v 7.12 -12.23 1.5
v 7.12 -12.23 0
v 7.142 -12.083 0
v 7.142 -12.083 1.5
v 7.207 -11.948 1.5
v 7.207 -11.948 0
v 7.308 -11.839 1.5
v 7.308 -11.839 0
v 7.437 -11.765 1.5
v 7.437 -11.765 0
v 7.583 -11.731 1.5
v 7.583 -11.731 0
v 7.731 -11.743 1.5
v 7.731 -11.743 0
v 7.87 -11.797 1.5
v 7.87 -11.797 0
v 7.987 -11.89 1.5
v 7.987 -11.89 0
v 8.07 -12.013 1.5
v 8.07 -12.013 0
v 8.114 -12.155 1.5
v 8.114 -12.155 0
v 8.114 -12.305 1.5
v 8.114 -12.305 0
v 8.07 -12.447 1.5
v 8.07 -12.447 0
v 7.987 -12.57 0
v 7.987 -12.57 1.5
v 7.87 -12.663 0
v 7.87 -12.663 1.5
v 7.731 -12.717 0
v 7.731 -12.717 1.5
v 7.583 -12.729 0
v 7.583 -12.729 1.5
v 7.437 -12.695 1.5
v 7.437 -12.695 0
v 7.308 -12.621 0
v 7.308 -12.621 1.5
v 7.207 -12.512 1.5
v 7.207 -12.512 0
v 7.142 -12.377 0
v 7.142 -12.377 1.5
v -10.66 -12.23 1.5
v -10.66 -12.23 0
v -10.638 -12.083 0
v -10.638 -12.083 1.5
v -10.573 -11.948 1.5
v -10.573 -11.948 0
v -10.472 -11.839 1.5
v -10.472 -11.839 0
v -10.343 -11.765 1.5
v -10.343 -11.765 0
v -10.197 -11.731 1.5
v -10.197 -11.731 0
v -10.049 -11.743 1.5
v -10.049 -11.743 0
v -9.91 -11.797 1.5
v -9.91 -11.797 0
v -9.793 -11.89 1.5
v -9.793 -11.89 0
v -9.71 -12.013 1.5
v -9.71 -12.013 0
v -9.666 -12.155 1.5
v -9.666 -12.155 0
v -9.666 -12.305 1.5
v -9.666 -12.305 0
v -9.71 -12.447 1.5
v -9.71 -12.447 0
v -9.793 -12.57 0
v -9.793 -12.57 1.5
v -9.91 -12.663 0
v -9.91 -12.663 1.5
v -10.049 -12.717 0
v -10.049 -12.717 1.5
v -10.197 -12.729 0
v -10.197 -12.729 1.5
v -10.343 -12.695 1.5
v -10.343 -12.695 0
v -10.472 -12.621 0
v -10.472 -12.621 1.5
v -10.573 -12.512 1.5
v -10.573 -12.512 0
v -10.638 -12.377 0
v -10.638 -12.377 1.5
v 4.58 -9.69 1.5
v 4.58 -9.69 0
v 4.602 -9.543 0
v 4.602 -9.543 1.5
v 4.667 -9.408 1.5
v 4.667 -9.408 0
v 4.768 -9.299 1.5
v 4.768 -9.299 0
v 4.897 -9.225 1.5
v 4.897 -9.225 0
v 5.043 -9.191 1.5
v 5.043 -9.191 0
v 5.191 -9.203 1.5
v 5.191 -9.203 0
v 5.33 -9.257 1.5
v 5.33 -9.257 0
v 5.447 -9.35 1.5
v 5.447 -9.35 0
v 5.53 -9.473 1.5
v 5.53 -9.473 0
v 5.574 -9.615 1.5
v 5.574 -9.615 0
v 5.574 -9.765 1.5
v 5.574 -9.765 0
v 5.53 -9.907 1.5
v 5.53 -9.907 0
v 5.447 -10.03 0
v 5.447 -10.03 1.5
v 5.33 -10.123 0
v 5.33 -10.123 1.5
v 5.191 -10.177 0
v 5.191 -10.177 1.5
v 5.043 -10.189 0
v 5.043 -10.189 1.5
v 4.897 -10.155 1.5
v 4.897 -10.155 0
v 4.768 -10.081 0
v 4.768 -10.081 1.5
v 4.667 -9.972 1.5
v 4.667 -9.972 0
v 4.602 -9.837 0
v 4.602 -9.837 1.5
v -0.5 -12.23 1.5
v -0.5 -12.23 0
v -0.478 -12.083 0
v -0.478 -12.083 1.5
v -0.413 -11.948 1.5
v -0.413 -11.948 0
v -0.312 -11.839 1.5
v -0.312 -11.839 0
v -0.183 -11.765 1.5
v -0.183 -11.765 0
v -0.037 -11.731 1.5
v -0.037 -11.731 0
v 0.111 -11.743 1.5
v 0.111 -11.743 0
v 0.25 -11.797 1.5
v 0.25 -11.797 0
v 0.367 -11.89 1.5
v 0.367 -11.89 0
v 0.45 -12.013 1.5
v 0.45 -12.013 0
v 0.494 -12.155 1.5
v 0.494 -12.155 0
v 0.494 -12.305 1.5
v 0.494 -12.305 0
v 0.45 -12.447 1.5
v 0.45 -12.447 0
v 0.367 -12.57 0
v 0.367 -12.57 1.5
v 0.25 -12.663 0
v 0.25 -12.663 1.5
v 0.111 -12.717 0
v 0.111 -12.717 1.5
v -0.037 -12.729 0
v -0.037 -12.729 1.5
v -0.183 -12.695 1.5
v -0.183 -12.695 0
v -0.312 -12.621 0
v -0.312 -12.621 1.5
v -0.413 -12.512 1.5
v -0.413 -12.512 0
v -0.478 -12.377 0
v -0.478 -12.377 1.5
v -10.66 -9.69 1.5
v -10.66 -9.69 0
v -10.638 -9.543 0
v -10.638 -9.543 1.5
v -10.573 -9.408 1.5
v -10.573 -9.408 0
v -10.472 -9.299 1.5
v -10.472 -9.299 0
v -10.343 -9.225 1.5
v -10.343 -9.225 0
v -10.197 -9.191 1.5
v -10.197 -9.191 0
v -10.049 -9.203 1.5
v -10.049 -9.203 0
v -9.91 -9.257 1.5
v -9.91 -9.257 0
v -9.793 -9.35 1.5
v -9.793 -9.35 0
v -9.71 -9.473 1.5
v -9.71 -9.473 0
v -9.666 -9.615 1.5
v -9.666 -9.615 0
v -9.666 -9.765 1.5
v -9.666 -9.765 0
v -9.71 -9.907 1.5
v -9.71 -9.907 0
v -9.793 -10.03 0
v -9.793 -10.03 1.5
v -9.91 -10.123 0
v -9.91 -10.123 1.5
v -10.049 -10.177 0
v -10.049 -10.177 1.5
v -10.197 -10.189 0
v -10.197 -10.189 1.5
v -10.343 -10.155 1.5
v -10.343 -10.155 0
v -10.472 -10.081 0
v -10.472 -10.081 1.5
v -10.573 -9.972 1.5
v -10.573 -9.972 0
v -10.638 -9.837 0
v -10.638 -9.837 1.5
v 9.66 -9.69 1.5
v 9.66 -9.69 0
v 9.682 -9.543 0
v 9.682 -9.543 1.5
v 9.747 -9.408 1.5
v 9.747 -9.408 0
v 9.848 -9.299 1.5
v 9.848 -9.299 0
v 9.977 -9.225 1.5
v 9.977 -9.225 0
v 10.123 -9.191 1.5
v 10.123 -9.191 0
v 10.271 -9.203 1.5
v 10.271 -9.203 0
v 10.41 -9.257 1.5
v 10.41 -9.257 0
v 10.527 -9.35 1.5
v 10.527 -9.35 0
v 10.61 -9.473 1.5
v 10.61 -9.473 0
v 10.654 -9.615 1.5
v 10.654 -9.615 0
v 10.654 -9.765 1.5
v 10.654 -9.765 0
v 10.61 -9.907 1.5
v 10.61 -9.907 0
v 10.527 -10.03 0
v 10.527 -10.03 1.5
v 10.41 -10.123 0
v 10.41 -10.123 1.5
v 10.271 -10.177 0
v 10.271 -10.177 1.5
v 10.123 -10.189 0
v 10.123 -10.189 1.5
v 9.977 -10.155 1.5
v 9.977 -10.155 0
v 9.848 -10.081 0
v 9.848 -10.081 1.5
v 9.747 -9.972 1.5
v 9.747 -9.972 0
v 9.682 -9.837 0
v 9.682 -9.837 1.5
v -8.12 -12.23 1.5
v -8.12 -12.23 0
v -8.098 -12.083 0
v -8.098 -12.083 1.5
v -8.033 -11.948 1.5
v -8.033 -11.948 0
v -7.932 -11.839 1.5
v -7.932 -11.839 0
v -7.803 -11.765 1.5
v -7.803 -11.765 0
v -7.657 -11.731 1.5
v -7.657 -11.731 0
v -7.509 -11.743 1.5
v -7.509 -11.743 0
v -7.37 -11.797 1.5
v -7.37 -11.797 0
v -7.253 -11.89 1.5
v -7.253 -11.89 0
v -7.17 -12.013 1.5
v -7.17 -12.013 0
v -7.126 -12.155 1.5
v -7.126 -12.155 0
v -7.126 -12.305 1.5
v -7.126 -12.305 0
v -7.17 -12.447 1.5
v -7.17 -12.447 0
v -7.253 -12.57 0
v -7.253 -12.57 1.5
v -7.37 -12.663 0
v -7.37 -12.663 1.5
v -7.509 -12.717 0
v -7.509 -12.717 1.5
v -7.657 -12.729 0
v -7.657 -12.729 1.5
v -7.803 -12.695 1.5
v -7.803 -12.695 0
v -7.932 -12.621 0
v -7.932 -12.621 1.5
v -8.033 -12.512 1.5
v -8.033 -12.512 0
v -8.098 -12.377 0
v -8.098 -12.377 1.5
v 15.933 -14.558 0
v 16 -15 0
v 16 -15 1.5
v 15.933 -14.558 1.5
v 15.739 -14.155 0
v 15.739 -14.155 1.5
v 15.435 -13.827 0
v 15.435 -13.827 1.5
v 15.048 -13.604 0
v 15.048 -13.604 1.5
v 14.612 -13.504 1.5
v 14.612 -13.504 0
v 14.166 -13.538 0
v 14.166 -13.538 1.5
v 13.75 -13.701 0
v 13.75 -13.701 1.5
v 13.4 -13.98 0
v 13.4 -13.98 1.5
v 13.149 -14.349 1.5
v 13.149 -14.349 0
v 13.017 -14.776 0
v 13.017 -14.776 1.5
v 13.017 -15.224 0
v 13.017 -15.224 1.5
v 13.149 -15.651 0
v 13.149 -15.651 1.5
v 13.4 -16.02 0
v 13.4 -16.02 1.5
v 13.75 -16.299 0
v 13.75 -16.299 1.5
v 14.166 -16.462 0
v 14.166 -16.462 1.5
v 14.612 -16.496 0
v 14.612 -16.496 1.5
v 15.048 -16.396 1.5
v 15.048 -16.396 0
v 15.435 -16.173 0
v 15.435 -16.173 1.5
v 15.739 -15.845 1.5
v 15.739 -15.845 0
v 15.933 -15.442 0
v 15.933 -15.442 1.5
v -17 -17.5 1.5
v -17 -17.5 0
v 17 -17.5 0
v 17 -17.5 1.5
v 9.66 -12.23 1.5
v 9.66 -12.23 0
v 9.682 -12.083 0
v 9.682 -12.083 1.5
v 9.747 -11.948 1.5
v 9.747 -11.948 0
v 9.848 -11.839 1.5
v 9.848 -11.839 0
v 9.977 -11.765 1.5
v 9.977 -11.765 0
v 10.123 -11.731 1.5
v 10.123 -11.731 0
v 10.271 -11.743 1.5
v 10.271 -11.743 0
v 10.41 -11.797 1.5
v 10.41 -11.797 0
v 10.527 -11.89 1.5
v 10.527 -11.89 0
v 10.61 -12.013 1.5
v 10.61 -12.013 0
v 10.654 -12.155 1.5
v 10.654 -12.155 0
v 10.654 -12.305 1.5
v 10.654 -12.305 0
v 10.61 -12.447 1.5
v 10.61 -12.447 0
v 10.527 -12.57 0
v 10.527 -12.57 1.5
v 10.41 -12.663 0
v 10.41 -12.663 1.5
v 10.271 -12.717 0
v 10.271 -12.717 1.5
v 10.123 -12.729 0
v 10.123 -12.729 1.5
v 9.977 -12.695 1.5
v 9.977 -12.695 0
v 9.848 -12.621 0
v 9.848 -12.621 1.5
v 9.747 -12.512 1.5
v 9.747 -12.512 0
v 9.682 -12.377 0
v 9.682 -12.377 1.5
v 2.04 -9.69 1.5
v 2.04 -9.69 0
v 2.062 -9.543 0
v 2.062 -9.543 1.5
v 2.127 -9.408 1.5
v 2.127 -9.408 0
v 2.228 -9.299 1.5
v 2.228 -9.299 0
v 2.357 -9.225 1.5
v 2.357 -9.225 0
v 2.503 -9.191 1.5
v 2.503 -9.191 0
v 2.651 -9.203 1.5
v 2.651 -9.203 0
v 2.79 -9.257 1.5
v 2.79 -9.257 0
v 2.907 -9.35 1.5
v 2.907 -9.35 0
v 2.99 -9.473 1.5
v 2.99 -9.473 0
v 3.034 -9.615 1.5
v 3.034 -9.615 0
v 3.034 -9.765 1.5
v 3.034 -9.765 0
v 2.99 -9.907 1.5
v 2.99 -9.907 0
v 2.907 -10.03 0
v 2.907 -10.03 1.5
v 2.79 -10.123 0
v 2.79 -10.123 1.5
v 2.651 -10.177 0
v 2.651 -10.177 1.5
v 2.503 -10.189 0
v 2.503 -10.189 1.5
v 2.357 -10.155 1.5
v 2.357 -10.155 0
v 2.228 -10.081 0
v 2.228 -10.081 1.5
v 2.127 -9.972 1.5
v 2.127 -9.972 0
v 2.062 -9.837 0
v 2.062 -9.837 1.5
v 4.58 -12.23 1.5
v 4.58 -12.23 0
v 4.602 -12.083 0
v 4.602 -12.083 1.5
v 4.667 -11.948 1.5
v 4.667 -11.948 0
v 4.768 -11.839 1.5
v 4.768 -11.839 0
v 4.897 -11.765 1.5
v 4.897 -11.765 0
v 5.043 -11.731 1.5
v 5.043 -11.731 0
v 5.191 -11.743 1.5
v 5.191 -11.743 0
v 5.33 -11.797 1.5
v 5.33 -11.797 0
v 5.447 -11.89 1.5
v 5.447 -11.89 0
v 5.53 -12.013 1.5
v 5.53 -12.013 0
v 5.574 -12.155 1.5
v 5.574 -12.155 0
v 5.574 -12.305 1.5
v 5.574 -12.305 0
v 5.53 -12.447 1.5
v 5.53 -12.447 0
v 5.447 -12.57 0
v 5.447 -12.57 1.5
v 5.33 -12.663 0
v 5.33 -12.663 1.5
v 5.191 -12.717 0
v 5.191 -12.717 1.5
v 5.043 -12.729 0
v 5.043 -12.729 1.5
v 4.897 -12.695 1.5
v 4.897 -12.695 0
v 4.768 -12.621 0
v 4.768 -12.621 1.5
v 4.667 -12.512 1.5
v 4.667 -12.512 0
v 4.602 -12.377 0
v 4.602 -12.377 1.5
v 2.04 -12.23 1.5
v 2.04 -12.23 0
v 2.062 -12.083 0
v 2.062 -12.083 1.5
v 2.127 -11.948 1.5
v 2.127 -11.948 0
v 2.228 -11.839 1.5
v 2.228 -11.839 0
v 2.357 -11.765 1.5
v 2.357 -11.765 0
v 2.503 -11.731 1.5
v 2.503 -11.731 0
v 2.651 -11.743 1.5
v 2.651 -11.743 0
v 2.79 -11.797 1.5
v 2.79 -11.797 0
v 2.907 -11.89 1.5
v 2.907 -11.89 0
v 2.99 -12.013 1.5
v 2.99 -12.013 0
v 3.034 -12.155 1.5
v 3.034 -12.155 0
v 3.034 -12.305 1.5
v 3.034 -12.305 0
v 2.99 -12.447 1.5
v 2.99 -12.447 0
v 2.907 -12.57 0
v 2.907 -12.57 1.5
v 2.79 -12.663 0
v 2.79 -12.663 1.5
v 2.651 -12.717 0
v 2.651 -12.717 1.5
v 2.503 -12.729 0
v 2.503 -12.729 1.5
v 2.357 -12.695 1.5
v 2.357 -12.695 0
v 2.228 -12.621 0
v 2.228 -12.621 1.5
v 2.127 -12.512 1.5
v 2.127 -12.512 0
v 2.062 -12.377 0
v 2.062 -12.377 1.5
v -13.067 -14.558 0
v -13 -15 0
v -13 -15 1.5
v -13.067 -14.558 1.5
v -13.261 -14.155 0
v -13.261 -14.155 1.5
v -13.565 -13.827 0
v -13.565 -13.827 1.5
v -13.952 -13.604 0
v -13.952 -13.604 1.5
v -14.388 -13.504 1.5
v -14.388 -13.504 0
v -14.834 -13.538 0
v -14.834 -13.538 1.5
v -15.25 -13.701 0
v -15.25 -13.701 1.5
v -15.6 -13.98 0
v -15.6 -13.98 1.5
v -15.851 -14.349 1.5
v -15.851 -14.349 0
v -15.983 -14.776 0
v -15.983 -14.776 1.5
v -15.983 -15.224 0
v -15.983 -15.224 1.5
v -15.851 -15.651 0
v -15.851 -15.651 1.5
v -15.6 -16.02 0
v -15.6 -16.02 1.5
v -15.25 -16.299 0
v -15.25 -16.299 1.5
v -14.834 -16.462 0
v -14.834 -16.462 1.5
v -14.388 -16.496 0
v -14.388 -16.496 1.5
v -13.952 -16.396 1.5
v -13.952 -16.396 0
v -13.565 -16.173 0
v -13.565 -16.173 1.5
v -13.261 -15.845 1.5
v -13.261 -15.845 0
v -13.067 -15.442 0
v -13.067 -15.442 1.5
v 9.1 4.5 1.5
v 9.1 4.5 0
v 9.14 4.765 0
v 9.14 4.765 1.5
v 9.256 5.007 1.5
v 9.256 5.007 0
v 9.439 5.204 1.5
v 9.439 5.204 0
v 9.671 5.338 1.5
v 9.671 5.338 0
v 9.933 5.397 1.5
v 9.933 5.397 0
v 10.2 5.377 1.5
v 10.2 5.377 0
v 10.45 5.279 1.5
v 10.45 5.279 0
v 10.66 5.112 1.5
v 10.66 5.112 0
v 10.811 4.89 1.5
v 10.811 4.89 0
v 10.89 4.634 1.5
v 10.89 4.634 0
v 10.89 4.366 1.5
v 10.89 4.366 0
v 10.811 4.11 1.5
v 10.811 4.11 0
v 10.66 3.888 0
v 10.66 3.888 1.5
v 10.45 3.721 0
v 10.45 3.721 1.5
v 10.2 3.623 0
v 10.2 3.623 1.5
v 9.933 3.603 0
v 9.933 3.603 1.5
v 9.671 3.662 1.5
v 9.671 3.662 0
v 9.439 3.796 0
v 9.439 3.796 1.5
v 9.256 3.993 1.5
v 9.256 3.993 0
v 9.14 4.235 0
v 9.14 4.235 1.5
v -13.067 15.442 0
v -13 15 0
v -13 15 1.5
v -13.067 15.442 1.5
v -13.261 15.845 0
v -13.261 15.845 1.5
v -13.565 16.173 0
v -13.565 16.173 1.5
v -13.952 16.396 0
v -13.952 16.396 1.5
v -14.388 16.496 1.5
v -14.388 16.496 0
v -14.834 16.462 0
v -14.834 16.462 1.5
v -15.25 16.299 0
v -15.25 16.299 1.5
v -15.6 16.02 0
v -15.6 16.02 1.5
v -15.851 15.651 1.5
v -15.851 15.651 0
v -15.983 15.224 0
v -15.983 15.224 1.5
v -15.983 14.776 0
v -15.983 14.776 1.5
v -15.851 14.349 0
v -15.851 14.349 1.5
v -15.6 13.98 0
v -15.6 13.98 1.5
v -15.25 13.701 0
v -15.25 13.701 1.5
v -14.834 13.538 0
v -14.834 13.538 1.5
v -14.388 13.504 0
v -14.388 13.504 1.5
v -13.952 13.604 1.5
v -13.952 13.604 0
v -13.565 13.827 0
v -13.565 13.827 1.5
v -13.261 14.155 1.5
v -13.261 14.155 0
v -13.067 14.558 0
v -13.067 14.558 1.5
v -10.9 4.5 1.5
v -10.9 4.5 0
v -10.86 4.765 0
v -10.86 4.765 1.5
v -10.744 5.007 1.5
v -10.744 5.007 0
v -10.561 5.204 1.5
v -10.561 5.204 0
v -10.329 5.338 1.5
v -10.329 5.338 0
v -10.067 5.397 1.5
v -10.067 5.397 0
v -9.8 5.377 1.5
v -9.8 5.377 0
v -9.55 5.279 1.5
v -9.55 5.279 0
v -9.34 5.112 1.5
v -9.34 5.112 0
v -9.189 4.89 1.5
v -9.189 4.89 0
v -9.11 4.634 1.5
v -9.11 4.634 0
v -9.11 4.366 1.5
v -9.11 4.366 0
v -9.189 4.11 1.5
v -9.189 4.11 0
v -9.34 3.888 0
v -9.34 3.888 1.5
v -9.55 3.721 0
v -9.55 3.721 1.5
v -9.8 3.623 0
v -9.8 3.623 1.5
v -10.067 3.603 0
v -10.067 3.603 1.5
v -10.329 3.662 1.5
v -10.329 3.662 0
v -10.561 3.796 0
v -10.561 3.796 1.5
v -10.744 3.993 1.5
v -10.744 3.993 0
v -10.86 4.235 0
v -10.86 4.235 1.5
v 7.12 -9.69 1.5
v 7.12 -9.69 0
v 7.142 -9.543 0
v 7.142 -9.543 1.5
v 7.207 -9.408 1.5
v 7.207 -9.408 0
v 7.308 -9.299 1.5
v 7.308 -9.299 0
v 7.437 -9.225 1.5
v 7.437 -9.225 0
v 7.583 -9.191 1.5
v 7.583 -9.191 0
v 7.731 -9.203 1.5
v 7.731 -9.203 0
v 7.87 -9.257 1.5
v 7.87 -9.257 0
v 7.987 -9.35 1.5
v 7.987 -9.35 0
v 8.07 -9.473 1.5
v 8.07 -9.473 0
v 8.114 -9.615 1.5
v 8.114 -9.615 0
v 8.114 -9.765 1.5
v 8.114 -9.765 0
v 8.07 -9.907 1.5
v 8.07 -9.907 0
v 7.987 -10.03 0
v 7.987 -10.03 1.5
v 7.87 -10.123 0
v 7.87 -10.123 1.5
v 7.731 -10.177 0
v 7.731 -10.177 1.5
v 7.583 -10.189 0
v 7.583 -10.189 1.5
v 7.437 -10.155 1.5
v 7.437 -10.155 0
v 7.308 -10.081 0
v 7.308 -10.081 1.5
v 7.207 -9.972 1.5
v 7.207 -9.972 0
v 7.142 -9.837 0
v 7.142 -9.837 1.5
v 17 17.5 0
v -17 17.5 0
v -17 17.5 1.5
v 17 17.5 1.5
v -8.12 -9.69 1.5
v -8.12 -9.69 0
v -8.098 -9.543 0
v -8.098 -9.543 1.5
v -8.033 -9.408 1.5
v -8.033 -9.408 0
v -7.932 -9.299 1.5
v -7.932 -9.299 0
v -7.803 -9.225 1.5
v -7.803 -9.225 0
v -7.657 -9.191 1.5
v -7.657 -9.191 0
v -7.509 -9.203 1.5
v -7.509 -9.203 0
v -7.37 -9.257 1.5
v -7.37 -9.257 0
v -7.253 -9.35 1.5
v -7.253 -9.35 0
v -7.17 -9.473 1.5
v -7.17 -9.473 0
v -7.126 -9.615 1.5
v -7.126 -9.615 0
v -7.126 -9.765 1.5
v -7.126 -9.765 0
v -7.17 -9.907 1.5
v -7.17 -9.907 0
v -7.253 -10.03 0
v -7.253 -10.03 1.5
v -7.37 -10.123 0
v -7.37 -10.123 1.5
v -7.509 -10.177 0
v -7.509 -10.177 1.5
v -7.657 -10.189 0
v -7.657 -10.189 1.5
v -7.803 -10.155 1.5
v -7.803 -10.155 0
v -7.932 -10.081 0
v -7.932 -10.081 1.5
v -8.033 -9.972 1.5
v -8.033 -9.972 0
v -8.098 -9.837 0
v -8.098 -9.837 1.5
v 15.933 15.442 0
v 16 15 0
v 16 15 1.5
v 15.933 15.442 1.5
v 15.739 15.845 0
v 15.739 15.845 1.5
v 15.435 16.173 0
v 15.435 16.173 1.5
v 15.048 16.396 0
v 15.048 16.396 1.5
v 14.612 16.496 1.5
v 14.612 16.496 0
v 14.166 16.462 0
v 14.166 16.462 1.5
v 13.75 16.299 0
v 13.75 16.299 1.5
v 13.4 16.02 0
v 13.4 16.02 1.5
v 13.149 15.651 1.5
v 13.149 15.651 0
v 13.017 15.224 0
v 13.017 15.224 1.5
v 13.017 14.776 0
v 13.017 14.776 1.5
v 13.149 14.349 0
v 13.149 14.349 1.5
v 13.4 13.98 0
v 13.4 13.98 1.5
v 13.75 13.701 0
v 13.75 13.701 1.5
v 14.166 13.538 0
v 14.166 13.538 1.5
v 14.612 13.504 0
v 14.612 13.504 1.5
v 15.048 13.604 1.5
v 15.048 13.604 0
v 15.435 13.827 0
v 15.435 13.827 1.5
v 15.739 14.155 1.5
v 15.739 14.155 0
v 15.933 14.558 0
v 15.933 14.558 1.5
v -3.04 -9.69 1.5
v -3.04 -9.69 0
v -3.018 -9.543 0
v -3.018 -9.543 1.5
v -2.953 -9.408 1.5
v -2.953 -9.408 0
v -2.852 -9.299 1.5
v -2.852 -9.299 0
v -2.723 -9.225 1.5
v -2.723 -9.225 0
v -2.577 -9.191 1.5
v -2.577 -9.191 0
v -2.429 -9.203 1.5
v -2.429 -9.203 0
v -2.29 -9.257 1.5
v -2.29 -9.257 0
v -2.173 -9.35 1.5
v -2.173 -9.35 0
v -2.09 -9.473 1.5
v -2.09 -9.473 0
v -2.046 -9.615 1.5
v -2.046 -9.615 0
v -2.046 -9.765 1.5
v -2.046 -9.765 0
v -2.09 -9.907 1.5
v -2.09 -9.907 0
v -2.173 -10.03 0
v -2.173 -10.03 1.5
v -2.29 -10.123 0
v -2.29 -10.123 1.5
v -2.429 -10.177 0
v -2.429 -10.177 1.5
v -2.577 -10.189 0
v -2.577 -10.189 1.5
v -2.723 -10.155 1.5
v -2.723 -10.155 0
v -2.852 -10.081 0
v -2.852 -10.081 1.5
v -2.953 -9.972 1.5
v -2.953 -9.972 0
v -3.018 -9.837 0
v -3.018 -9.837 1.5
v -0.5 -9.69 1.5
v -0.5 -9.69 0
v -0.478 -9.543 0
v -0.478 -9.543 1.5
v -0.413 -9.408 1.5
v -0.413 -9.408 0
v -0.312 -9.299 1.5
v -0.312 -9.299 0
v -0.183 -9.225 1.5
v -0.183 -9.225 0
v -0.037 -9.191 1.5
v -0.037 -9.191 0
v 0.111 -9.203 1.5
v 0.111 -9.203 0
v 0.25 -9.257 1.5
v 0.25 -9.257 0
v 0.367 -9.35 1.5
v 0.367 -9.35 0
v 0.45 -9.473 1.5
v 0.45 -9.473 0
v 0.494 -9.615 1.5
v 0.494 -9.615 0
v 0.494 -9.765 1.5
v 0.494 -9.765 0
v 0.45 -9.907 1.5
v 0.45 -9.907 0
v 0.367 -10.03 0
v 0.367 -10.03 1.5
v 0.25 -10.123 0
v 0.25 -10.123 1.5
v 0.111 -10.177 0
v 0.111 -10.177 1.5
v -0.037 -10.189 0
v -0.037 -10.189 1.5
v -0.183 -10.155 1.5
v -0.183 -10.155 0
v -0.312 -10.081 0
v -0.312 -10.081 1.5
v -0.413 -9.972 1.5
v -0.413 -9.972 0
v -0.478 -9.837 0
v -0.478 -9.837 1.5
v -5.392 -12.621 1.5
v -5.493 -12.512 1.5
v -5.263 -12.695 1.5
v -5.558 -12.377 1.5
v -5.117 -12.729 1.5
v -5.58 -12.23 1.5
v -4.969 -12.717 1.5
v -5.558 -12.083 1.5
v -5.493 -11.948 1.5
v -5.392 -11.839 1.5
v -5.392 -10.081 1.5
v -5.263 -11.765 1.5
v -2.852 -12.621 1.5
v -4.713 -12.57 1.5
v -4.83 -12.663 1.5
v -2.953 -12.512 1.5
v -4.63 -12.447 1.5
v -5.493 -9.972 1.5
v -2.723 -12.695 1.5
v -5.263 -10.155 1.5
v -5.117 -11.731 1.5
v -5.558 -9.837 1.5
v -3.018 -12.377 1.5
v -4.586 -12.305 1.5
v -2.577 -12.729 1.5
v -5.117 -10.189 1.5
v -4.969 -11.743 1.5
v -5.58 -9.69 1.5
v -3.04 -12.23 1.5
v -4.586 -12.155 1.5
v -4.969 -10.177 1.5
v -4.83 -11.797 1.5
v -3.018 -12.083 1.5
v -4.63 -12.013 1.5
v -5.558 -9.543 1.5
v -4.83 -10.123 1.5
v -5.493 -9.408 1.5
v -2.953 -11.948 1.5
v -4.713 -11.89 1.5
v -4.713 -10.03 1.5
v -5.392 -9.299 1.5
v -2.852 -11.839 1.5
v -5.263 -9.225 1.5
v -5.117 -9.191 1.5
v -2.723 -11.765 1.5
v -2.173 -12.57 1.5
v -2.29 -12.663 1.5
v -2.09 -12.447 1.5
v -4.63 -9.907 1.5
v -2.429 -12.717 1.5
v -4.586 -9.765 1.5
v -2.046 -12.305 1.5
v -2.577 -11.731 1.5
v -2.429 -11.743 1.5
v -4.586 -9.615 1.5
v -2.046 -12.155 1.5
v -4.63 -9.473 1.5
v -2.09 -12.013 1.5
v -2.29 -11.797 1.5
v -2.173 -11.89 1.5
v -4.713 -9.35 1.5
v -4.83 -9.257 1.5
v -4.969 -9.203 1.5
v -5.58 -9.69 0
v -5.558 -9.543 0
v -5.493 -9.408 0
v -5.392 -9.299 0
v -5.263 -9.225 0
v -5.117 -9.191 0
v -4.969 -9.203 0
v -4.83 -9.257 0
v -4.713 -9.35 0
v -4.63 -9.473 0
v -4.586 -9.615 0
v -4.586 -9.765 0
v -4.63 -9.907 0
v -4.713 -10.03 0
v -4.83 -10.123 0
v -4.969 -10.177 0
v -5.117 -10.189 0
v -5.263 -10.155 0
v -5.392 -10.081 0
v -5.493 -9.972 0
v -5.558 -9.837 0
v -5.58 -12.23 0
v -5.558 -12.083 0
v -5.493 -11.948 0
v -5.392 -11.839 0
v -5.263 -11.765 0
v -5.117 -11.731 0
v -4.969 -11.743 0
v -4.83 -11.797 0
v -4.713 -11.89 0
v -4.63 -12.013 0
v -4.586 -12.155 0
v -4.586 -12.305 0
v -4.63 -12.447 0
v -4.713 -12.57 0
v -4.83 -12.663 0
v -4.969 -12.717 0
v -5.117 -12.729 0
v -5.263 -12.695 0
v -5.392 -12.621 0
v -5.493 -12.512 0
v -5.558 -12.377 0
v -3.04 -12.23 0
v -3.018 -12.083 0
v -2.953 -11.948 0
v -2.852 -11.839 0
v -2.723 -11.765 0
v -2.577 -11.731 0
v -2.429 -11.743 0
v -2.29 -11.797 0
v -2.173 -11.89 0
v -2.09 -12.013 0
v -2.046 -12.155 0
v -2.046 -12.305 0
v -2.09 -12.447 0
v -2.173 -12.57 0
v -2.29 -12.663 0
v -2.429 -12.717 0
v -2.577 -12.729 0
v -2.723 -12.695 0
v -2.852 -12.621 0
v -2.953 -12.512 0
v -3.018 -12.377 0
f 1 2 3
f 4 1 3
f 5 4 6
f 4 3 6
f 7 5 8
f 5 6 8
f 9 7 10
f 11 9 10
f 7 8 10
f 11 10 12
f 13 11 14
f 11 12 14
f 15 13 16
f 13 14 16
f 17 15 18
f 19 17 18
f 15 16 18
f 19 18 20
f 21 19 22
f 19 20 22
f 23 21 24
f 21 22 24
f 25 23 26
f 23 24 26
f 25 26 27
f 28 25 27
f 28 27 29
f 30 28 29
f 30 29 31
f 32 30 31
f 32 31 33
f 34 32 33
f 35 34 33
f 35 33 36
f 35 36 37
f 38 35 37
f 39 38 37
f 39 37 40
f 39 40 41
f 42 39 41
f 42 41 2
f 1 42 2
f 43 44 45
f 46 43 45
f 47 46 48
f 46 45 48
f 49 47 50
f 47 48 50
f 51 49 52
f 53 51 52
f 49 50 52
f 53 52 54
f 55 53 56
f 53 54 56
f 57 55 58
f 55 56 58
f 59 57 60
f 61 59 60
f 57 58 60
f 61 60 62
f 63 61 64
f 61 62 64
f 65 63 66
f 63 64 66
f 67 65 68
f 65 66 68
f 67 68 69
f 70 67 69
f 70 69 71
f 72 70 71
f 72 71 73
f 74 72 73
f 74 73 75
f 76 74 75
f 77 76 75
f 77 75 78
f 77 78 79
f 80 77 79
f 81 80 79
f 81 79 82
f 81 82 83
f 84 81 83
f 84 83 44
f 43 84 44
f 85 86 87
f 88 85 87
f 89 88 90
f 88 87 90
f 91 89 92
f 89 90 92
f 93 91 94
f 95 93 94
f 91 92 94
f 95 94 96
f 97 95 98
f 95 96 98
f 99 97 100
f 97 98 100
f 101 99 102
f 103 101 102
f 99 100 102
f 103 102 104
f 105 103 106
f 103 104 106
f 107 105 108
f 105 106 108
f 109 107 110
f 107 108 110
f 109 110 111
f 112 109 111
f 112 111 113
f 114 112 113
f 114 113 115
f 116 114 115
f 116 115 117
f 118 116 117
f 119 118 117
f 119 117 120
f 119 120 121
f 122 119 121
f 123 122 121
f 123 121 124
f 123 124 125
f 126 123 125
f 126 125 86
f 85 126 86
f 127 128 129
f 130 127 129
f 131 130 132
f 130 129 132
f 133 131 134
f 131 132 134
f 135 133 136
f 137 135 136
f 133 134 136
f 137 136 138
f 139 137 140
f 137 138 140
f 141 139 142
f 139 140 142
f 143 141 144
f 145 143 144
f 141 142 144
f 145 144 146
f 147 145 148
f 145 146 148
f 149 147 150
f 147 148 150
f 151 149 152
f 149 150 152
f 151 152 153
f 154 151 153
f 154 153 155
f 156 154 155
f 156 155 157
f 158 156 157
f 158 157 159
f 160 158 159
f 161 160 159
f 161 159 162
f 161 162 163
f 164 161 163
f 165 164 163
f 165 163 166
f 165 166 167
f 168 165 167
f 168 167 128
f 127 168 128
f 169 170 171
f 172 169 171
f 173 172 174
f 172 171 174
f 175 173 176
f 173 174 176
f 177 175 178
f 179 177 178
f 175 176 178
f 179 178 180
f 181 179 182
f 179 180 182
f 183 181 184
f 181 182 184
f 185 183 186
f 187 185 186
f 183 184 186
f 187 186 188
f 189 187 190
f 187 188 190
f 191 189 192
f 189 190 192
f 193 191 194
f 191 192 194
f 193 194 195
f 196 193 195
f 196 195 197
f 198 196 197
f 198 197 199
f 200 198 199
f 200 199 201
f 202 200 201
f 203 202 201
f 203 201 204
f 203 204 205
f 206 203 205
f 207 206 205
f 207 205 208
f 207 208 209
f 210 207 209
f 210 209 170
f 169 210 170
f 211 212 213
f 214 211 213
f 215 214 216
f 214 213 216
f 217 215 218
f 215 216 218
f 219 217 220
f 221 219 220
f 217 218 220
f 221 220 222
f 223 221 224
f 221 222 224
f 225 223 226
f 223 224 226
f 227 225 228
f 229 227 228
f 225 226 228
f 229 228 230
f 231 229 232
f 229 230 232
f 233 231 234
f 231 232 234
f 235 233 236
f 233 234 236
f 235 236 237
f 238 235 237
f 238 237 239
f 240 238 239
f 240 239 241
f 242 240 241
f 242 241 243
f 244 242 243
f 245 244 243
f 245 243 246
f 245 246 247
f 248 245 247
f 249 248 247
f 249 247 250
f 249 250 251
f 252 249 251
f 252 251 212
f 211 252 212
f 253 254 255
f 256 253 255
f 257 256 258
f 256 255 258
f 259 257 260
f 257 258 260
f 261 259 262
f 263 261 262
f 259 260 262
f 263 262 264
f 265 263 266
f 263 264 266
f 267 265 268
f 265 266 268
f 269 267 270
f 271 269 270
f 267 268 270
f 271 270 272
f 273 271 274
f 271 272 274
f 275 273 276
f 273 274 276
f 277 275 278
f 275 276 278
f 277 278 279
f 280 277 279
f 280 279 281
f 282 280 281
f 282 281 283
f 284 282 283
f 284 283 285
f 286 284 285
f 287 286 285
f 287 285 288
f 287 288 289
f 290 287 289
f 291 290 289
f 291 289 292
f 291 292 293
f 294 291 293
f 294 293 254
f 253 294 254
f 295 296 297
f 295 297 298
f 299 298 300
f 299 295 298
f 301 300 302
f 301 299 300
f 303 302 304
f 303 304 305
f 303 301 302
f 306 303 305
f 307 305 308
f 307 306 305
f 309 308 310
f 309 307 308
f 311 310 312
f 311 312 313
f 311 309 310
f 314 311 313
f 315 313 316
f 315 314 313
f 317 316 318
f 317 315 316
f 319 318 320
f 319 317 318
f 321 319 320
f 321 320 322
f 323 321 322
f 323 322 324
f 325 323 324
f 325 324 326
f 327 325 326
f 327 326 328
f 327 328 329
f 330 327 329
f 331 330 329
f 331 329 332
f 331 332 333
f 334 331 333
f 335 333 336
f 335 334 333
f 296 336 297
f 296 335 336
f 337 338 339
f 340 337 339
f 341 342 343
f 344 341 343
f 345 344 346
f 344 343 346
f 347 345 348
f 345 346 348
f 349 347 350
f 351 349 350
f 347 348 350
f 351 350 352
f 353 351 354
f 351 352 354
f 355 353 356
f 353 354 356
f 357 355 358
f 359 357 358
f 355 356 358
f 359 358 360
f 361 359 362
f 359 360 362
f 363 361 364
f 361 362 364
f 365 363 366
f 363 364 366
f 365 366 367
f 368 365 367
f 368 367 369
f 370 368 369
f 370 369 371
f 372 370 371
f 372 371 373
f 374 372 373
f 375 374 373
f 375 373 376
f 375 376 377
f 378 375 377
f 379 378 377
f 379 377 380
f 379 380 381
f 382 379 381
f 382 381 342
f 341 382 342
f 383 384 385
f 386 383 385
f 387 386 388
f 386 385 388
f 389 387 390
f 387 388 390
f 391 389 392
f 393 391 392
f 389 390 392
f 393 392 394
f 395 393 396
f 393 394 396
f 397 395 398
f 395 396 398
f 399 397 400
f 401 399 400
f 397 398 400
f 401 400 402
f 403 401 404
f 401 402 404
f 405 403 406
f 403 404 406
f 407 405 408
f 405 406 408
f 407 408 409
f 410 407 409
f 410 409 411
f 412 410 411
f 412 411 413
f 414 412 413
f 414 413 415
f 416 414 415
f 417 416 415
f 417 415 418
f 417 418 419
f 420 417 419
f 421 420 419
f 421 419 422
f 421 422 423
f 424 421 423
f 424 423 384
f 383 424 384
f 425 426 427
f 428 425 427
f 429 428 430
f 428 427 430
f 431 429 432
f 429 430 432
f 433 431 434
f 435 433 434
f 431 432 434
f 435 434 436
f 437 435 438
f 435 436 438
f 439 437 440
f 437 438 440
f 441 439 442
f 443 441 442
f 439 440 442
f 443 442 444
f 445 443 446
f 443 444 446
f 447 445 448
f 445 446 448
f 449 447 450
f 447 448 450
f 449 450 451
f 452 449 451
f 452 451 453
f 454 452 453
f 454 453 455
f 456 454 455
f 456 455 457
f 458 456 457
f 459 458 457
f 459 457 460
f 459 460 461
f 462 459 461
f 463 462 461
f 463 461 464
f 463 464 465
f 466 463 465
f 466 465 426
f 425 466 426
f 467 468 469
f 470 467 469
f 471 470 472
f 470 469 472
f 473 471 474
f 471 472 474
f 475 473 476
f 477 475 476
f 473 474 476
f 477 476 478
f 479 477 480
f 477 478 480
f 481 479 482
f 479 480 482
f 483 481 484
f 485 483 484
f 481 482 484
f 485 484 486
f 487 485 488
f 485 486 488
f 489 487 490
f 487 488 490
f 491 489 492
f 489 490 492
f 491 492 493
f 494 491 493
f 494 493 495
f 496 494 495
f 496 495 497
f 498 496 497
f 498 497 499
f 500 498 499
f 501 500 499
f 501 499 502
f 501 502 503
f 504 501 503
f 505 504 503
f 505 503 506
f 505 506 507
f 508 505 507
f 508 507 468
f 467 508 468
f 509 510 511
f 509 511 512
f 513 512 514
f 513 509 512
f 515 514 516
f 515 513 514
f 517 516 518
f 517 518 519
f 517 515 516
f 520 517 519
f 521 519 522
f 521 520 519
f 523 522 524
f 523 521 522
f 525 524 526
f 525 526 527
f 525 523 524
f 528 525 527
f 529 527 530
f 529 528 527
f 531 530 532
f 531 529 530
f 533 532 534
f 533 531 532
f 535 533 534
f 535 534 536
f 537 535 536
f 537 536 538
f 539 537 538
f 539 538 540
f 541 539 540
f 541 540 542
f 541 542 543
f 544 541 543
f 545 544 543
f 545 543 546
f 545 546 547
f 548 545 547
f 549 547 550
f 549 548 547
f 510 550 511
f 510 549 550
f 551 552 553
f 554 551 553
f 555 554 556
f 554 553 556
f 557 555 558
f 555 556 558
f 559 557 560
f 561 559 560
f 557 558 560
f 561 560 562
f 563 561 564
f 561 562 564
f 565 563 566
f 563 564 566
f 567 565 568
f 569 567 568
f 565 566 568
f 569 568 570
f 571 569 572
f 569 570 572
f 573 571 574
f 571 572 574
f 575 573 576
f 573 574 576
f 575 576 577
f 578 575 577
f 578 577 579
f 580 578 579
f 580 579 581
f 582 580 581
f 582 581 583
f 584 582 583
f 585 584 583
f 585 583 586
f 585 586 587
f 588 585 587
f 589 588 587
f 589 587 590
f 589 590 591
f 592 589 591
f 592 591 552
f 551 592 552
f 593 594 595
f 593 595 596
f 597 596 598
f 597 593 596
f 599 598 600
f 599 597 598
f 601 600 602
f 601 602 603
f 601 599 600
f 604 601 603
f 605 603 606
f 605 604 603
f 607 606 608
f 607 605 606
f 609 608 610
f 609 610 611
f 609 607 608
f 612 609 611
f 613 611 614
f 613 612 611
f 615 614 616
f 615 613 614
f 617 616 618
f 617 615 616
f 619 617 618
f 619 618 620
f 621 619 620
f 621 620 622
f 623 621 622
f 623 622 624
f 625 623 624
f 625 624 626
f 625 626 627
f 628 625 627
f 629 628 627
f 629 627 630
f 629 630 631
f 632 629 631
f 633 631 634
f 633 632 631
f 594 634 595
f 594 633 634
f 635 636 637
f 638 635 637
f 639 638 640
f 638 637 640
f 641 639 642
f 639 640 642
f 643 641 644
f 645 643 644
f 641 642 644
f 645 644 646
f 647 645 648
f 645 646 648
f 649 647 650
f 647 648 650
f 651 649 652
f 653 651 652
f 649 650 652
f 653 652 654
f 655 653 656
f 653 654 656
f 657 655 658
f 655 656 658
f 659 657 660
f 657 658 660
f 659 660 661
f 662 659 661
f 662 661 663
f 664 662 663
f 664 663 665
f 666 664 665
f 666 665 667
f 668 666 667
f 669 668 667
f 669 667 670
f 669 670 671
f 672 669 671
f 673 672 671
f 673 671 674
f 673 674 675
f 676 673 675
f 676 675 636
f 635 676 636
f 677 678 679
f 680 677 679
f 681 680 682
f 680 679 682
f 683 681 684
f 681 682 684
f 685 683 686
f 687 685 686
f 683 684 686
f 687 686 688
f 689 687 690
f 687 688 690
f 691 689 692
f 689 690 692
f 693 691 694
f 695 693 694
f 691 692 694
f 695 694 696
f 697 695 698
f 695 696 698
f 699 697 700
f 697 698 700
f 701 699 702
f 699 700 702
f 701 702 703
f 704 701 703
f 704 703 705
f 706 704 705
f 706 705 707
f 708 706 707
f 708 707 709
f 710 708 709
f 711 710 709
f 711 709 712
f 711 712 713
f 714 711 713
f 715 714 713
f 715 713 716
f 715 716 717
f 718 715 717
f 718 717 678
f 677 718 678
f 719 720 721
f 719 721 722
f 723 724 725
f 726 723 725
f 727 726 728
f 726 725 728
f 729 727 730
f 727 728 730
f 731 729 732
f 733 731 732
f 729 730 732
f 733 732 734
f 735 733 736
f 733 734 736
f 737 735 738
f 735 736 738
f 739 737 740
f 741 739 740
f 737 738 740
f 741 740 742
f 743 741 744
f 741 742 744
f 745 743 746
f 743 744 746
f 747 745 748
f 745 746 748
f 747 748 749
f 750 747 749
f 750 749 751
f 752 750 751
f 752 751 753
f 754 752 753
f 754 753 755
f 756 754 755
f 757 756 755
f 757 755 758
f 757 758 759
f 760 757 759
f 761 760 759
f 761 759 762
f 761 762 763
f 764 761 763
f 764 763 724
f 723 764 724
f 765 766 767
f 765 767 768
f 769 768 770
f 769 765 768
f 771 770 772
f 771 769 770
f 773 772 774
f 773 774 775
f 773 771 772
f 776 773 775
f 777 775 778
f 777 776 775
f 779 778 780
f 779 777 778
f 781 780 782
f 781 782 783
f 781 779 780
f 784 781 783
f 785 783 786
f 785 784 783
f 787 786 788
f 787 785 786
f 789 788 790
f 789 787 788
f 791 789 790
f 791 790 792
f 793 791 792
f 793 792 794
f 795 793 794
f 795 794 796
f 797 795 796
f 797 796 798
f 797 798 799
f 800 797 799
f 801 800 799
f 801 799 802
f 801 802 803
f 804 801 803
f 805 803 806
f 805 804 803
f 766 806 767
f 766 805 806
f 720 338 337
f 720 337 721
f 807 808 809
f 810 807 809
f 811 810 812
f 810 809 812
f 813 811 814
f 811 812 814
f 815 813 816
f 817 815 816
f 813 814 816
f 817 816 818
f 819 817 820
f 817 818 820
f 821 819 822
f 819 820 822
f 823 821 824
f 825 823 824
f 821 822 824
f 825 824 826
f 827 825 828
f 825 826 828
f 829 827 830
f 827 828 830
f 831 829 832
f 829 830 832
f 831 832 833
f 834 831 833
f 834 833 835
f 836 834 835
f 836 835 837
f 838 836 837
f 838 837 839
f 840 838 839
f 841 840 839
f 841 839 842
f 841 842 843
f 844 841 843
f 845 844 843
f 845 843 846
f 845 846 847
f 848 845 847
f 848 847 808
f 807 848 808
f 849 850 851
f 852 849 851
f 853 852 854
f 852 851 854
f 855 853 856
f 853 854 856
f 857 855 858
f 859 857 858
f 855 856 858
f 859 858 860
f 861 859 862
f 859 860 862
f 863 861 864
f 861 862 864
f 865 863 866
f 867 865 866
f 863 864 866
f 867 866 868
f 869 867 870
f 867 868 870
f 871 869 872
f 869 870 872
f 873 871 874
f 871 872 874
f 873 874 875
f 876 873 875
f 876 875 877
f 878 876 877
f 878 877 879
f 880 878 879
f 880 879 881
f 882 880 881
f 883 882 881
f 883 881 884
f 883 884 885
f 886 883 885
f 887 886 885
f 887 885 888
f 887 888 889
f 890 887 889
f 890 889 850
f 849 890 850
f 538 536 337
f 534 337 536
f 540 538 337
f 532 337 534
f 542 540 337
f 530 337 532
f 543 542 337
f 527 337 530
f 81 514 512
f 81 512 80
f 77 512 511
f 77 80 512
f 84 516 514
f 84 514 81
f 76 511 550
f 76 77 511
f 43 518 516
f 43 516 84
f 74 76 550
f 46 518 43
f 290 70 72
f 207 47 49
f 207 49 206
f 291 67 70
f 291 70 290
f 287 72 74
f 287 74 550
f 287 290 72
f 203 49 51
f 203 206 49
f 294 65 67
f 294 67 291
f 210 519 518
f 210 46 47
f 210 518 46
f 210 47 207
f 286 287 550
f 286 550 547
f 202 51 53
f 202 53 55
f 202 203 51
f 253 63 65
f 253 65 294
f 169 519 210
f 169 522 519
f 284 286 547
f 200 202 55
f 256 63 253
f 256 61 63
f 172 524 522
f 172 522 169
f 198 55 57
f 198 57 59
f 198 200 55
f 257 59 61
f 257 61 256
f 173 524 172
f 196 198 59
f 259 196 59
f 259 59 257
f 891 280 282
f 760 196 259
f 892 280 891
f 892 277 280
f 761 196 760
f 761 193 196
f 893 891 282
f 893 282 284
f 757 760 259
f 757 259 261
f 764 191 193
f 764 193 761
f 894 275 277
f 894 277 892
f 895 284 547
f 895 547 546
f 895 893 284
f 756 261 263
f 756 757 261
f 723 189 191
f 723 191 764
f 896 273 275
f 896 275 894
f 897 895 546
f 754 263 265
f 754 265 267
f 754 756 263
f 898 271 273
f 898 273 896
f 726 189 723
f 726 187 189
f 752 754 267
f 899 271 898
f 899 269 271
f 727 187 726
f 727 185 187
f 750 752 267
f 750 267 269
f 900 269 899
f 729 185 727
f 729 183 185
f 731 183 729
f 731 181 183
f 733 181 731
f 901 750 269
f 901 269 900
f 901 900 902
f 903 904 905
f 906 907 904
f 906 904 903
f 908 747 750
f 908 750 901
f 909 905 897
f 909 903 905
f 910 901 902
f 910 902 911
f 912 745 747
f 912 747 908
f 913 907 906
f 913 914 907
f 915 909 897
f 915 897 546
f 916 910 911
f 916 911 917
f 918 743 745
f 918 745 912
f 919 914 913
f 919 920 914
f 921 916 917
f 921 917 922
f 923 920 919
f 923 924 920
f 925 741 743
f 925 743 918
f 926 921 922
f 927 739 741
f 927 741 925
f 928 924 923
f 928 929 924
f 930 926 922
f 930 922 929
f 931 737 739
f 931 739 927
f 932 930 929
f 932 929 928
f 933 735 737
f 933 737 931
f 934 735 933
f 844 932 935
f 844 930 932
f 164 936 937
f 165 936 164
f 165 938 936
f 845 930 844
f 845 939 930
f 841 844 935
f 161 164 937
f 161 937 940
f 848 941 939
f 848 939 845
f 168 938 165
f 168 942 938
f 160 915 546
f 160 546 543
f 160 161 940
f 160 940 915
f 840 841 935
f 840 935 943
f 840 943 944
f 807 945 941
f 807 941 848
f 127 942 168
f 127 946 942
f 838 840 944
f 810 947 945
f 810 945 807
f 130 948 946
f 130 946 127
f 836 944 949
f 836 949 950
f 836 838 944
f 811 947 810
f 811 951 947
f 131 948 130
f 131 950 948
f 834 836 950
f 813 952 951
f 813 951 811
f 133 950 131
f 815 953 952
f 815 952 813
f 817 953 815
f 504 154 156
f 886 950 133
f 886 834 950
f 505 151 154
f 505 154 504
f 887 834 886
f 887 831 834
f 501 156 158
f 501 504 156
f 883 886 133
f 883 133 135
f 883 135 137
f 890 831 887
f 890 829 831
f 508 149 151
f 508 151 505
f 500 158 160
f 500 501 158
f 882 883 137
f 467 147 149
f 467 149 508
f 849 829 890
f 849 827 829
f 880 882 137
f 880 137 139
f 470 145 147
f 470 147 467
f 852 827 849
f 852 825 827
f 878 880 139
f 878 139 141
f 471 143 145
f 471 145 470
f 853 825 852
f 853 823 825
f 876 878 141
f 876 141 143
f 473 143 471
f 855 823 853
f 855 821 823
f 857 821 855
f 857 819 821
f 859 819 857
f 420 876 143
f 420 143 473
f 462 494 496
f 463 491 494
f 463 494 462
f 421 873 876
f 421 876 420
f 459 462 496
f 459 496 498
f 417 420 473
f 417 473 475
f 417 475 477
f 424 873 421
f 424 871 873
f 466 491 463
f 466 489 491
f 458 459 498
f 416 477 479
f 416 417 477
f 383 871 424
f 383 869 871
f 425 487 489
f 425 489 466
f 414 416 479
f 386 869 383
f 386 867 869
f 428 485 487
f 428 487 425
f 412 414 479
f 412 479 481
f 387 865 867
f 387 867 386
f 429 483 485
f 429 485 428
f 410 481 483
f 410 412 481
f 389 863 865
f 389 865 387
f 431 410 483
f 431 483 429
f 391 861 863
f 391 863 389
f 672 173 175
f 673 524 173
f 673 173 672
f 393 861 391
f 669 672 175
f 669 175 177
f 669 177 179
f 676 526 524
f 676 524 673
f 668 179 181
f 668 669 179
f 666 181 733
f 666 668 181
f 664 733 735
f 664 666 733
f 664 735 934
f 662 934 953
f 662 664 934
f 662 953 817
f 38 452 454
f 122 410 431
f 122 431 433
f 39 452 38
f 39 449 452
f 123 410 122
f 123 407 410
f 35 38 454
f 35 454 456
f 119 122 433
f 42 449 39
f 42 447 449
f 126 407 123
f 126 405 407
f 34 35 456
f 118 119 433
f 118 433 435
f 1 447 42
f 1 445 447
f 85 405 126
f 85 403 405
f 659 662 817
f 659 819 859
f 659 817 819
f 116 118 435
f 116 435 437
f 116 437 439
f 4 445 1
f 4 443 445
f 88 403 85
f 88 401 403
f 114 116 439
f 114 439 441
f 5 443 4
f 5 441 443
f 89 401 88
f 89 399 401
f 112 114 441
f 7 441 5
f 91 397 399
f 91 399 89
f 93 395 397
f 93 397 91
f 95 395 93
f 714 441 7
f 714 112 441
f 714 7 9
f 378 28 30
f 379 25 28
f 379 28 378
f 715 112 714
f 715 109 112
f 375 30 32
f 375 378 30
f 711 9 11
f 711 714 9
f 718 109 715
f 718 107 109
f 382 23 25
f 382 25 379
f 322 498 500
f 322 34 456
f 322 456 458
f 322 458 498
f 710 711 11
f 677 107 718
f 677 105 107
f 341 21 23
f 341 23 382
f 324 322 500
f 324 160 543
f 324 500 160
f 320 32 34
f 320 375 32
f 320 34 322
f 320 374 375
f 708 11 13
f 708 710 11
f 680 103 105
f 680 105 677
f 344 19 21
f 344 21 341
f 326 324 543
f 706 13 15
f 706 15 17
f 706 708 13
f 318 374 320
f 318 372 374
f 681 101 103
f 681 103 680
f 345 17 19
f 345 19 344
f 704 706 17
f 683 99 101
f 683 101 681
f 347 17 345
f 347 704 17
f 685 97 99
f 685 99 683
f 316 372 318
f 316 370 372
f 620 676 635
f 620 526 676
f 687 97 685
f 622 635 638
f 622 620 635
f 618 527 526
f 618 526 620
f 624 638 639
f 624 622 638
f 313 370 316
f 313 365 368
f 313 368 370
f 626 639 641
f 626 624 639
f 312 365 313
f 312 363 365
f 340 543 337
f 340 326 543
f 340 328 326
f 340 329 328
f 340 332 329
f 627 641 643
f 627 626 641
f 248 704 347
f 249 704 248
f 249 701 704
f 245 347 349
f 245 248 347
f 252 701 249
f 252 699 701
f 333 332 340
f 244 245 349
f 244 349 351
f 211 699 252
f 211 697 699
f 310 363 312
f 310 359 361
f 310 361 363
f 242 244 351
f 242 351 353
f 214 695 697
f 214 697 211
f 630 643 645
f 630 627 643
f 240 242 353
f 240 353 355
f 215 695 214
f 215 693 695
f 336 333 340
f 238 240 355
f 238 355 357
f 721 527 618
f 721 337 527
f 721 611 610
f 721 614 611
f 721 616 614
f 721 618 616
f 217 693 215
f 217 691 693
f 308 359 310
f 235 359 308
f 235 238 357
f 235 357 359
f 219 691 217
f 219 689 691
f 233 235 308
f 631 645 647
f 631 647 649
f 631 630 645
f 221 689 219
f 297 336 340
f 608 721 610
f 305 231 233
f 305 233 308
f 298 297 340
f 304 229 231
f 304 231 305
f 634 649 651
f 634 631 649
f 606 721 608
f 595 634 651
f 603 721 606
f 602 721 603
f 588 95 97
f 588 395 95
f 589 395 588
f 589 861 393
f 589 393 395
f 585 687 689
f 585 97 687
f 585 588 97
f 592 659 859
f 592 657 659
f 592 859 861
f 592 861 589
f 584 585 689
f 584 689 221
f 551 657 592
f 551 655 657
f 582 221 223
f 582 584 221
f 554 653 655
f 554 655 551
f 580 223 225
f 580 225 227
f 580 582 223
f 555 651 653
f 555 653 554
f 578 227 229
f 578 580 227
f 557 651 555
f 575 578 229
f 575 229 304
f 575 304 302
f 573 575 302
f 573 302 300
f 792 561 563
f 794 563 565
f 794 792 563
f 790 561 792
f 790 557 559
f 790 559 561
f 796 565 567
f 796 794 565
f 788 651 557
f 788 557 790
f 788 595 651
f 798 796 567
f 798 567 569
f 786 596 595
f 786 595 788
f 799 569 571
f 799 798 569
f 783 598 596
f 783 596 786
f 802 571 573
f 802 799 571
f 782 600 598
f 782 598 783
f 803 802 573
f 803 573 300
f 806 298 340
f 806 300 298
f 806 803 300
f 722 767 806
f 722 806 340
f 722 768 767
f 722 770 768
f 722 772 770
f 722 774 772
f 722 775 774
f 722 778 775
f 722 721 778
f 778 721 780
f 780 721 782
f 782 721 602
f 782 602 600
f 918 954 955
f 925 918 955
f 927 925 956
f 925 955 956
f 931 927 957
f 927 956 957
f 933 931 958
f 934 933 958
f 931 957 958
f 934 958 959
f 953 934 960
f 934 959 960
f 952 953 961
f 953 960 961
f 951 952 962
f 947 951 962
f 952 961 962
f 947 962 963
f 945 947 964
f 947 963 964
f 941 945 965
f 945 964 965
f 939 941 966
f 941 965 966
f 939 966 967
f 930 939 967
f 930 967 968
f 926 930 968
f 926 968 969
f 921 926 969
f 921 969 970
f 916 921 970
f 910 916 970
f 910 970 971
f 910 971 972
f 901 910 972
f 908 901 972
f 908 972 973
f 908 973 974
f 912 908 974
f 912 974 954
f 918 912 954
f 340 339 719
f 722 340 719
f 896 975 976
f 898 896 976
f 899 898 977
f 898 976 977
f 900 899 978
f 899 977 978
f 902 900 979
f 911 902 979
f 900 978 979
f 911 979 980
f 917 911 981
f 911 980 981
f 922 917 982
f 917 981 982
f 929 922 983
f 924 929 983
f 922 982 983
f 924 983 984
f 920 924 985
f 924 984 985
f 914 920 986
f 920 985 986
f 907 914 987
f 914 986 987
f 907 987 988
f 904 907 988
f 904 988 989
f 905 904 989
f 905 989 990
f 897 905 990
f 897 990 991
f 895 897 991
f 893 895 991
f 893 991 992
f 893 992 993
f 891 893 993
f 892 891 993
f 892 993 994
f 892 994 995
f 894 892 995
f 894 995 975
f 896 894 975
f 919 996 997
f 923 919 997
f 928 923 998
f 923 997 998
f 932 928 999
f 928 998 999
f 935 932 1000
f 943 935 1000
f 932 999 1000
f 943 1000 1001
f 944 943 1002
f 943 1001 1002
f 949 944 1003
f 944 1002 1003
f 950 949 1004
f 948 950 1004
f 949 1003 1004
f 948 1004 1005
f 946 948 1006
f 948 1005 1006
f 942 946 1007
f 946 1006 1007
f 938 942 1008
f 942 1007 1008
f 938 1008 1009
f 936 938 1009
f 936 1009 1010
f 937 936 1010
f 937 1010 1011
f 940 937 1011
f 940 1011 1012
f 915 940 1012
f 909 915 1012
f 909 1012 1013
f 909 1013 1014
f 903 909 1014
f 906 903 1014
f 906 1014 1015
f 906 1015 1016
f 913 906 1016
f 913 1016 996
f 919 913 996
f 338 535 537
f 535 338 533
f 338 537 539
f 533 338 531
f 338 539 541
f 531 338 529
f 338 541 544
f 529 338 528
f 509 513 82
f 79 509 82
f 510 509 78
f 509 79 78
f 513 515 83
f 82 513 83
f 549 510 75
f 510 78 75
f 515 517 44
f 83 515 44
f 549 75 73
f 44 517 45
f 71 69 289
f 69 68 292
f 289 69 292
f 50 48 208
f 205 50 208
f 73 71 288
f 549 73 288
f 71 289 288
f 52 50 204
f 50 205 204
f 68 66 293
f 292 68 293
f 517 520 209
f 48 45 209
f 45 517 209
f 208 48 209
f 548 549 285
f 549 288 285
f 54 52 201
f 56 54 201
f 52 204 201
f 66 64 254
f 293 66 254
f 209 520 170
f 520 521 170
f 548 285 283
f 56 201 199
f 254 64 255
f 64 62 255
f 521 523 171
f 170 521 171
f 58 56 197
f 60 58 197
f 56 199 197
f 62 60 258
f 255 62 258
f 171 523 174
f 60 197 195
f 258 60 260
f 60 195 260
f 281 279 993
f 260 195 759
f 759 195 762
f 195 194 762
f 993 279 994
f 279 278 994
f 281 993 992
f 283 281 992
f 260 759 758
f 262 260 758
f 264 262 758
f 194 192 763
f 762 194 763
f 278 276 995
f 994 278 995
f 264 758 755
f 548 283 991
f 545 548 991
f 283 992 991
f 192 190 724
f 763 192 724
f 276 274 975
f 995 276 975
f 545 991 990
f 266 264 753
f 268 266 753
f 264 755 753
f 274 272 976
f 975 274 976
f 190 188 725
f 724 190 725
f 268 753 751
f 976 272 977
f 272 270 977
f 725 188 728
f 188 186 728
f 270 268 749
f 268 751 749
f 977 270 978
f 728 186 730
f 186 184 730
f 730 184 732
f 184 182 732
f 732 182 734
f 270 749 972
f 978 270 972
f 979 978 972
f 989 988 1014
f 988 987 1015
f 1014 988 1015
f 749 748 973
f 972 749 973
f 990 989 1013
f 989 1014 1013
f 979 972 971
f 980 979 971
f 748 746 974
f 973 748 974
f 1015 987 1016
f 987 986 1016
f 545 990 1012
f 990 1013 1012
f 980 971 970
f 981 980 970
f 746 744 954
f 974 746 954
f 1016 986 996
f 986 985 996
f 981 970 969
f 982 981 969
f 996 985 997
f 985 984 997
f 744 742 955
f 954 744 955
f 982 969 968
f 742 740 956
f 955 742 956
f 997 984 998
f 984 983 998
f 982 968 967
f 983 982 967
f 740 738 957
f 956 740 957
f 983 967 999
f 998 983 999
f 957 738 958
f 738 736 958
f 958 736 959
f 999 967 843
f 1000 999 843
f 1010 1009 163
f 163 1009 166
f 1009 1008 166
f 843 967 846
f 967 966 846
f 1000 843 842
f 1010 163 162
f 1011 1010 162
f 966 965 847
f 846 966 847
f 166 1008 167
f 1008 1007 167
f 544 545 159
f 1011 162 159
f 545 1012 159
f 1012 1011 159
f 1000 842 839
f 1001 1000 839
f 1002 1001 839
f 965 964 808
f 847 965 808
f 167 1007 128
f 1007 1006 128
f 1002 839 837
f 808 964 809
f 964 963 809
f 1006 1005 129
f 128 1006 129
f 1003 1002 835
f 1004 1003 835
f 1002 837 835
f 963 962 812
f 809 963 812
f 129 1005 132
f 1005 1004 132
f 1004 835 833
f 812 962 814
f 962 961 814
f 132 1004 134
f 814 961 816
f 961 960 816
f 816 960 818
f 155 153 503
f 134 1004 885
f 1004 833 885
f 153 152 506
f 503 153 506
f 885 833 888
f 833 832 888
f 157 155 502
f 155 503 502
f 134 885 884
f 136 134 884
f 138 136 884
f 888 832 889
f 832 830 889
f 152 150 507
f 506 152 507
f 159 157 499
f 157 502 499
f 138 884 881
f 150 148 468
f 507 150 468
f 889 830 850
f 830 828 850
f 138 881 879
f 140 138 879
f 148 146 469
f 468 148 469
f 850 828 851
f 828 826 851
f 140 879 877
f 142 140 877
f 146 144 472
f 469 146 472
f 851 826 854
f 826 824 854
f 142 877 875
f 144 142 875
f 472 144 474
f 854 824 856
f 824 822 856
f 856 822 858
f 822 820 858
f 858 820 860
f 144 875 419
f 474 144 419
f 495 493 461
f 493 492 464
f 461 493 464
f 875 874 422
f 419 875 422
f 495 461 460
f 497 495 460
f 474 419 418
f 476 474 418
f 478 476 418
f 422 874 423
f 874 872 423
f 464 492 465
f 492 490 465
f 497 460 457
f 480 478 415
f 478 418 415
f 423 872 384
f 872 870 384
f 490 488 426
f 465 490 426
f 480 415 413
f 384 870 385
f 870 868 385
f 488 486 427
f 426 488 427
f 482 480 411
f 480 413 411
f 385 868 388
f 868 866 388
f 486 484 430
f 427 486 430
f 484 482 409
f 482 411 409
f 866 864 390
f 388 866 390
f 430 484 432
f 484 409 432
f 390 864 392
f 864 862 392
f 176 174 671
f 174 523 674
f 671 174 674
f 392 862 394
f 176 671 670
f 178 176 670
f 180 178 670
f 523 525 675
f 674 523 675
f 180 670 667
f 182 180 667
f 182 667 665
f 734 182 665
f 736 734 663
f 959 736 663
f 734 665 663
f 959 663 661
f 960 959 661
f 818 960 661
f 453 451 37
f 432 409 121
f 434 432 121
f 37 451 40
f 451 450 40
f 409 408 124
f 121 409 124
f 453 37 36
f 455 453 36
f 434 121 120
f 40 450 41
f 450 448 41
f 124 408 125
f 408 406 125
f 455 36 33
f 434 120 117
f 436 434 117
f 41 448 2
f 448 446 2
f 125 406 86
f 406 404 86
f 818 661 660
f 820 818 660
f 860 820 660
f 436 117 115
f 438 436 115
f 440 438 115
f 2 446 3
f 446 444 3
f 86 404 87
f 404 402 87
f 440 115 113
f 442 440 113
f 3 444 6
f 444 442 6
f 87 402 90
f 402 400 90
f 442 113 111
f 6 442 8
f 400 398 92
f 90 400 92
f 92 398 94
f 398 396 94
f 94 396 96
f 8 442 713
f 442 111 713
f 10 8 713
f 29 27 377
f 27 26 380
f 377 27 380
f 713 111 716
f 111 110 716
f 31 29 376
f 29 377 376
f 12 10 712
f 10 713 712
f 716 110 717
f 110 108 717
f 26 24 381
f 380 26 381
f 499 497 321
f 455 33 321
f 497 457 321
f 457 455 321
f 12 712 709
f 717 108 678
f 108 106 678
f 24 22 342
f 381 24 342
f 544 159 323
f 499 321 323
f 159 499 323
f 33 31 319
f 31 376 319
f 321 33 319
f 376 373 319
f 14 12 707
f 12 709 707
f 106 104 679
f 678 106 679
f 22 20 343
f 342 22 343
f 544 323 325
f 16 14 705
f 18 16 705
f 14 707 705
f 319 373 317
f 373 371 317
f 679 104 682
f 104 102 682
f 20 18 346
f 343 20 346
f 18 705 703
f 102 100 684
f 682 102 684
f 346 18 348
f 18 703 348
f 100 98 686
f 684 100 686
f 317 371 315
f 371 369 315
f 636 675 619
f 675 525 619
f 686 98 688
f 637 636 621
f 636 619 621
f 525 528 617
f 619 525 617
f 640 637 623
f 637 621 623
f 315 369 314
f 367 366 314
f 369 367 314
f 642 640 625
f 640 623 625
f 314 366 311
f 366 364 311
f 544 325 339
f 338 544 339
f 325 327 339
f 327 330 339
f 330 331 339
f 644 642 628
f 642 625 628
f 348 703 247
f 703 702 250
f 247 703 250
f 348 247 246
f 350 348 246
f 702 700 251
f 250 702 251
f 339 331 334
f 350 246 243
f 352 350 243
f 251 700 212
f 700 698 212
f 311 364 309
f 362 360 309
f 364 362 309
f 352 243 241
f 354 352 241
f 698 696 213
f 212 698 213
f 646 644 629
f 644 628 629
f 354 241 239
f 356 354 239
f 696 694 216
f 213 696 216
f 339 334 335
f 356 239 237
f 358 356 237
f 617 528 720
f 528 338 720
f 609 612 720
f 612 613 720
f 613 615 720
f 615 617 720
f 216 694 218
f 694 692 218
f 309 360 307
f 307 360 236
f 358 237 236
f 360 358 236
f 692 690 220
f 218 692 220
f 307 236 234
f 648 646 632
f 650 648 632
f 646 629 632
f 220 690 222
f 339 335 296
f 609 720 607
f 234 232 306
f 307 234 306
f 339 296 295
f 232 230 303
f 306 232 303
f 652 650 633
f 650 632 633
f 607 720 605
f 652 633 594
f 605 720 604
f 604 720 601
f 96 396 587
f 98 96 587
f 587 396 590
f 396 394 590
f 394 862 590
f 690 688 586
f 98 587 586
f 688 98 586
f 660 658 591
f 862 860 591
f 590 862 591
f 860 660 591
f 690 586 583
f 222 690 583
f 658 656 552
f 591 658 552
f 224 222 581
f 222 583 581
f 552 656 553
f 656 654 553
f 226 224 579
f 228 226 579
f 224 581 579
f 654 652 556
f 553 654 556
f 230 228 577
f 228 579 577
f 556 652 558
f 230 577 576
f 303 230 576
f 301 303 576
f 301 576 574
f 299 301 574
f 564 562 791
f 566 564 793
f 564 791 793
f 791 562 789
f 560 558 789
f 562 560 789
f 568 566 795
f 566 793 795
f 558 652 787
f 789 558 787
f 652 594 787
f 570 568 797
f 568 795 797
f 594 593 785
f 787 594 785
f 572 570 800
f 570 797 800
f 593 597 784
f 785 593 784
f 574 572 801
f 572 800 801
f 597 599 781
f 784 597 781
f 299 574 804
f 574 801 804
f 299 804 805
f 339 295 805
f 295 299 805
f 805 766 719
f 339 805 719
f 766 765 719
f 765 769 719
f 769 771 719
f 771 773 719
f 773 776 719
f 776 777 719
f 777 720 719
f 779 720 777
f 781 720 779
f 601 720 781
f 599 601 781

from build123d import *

# Parameters (mm, degrees)
SKETCH1_W   = 34
SKETCH1_H   = 35
SKETCH1_R   = 1.5
BOARD_DEPTH = 1.5
SKETCH2_R   = 0.9
SKETCH2_R_2 = 0.5
HOLES_DEPTH = 2


with BuildPart() as part:
    # Sketch1 → Board (new body)
    with BuildSketch(Plane.XY):
        Rectangle(SKETCH1_W, SKETCH1_H)
        with Locations((-14.5, 15)):
            Circle(SKETCH1_R, mode=Mode.SUBTRACT)
        with Locations((-14.5, -15)):
            Circle(SKETCH1_R, mode=Mode.SUBTRACT)
        with Locations((14.5, -15)):
            Circle(SKETCH1_R, mode=Mode.SUBTRACT)
        with Locations((14.5, 15)):
            Circle(SKETCH1_R, mode=Mode.SUBTRACT)
    extrude(amount=BOARD_DEPTH)

    # Sketch2 → Holes (cut)
    with BuildSketch(Plane(origin=(0, 0, 0), x_dir=(-1, 0, 0), z_dir=(0, 0, -1))):
        with Locations((-10, 4.5)):
            Circle(SKETCH2_R)
        with Locations((10, 4.5)):
            Circle(SKETCH2_R)
        with Locations((10.16, -9.69)):
            Circle(SKETCH2_R_2)
        with Locations((10.16, -12.23)):
            Circle(SKETCH2_R_2)
        with Locations((7.62, -12.23)):
            Circle(SKETCH2_R_2)
        with Locations((7.62, -9.69)):
            Circle(SKETCH2_R_2)
        with Locations((5.08, -12.23)):
            Circle(SKETCH2_R_2)
        with Locations((5.08, -9.69)):
            Circle(SKETCH2_R_2)
        with Locations((2.54, -12.23)):
            Circle(SKETCH2_R_2)
        with Locations((2.54, -9.69)):
            Circle(SKETCH2_R_2)
        with Locations((0, -12.23)):
            Circle(SKETCH2_R_2)
        with Locations((0, -9.69)):
            Circle(SKETCH2_R_2)
        with Locations((-2.54, -12.23)):
            Circle(SKETCH2_R_2)
        with Locations((-2.54, -9.69)):
            Circle(SKETCH2_R_2)
        with Locations((-5.08, -12.23)):
            Circle(SKETCH2_R_2)
        with Locations((-5.08, -9.69)):
            Circle(SKETCH2_R_2)
        with Locations((-7.62, -12.23)):
            Circle(SKETCH2_R_2)
        with Locations((-7.62, -9.69)):
            Circle(SKETCH2_R_2)
        with Locations((-10.16, -12.23)):
            Circle(SKETCH2_R_2)
        with Locations((-10.16, -9.69)):
            Circle(SKETCH2_R_2)
    extrude(amount=-HOLES_DEPTH, mode=Mode.SUBTRACT)


solid = part.part
